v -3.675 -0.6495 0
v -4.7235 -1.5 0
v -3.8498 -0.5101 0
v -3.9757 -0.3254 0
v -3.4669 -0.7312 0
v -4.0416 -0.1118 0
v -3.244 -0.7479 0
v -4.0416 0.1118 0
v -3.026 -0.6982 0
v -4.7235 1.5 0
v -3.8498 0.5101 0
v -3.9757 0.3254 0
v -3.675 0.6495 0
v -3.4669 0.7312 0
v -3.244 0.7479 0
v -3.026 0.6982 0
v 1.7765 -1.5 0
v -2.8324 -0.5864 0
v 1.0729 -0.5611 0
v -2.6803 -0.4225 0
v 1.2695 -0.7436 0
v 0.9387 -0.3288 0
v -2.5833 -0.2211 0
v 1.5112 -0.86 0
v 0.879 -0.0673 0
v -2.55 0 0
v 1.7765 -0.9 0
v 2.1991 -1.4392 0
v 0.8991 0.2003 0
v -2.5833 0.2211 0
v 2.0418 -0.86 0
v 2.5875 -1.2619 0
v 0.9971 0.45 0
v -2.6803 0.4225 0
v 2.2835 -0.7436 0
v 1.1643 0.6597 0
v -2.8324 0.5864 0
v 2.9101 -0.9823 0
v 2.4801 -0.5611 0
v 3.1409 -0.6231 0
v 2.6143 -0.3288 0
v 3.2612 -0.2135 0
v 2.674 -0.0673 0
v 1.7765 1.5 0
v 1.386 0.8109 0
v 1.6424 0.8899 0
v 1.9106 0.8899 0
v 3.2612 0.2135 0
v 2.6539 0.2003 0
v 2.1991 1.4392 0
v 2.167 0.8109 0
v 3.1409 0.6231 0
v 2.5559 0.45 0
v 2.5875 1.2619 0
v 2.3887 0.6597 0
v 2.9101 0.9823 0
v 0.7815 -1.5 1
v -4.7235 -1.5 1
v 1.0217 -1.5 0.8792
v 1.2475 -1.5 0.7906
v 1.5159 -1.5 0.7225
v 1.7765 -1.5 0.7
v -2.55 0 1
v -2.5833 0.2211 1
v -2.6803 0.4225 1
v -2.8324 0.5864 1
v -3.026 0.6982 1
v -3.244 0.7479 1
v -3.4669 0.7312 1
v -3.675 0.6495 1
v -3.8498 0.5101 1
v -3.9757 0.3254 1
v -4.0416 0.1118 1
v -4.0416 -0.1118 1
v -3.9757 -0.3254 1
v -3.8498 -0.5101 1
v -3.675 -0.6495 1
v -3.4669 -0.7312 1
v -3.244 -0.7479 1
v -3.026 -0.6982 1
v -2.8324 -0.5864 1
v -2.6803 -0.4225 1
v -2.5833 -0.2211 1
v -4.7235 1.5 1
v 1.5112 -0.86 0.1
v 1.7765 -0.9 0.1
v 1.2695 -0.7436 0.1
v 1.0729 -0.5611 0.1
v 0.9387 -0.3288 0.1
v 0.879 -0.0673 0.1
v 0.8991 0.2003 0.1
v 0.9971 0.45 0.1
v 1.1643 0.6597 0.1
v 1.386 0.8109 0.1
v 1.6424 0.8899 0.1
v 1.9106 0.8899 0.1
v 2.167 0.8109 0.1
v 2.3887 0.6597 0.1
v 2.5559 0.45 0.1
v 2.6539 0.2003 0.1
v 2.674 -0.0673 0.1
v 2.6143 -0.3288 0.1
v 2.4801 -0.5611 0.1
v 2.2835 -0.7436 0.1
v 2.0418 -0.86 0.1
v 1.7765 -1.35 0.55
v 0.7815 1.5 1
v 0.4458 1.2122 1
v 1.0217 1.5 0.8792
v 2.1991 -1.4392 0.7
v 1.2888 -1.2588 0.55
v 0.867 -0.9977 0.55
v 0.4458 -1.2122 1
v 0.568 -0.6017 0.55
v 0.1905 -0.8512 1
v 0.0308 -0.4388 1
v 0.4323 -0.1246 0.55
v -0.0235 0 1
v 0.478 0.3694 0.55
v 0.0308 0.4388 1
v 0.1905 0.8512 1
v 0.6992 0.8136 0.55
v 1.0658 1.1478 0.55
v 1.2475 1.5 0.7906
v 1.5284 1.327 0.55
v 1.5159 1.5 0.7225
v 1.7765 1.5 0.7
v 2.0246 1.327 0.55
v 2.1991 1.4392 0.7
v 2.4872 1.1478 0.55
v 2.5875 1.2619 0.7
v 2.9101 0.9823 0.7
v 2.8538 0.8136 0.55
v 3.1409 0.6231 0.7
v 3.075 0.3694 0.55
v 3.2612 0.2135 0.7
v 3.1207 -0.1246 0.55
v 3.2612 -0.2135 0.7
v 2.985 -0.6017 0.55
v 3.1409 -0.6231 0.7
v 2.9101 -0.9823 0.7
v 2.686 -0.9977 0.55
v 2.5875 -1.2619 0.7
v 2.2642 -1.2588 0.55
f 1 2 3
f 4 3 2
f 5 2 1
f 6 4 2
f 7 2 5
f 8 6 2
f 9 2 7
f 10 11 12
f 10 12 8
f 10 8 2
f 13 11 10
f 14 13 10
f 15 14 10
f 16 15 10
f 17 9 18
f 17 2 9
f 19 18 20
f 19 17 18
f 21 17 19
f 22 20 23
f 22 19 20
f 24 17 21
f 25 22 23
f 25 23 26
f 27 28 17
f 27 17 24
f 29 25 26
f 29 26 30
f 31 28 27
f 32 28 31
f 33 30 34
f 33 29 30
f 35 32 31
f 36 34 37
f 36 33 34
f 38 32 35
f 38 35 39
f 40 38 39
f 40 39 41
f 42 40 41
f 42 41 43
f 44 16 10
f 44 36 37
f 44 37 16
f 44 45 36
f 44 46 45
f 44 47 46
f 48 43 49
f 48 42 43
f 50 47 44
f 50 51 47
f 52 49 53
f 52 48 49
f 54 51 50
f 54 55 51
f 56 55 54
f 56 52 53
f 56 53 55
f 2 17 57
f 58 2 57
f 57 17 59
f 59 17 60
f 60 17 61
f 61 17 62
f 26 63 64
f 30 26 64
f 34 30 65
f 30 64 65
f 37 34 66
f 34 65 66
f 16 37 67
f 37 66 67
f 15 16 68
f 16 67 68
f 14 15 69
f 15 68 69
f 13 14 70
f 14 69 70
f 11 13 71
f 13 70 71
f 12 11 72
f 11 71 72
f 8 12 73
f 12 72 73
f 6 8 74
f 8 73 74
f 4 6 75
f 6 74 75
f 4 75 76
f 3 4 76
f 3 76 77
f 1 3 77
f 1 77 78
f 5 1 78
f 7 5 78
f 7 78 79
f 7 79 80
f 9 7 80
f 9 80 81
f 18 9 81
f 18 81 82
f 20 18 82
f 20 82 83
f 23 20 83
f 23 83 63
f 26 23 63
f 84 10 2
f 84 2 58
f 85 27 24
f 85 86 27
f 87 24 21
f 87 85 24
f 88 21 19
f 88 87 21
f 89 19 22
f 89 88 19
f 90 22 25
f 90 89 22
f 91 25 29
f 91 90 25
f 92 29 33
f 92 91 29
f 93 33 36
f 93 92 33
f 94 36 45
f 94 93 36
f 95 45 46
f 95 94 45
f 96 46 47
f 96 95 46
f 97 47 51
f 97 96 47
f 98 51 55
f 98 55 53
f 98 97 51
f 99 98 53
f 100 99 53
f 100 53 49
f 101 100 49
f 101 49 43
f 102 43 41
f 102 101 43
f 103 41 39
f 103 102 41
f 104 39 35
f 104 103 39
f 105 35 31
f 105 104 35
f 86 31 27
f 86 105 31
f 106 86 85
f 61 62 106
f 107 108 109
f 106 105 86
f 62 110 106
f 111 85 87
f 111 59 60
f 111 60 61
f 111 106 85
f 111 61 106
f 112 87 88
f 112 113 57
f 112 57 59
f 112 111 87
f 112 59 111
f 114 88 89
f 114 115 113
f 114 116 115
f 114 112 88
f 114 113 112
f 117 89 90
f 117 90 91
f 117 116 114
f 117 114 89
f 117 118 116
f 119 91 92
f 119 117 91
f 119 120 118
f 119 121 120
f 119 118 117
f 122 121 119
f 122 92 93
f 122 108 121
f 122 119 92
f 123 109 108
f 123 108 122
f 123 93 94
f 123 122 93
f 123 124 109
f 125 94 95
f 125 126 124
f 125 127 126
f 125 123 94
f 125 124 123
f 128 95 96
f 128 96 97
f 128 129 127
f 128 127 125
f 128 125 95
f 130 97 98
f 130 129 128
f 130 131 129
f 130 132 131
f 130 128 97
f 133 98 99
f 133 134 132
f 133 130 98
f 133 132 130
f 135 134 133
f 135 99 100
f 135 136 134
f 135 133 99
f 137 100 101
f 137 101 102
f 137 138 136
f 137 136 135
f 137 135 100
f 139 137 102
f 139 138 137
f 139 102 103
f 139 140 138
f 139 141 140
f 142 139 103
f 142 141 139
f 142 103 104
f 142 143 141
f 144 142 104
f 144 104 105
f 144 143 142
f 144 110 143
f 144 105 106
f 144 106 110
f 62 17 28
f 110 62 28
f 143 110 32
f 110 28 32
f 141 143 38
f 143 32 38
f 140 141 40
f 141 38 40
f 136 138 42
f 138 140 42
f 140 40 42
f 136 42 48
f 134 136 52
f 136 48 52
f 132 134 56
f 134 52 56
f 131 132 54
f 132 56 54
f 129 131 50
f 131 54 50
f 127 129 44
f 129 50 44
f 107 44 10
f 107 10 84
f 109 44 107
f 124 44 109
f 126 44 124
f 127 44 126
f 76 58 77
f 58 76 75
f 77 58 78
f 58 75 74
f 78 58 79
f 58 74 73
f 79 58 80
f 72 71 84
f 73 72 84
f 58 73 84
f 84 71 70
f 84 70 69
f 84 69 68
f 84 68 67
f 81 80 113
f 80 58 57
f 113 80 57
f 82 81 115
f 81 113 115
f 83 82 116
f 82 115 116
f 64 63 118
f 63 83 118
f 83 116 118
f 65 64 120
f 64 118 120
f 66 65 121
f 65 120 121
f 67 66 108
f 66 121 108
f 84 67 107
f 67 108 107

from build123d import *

# Parameters (mm, degrees)
BOSS_EXTRUDE1_DEPTH   = 1
SKETCH3_W             = 1
SKETCH3_H             = 3
BOSS_EXTRUDE2_DEPTH   = 5
F_1_5MM_DOWEL_HOLE1_D = 1.5


with BuildPart() as part:
    # Sketch1 → Boss-Extrude1 (new body)
    with BuildSketch(Plane.XY):
        with BuildLine():
            Line((1.776501472, 1.5), (0.276501472, 1.5))
            Line((0.276501472, 1.5), (0.276501472, -1.5))
            Line((0.276501472, -1.5), (1.776501472, -1.5))
            ThreePointArc((1.776501472, -1.5), (3.276501472, 0), (1.776501472, 1.5))
        make_face()
    extrude(amount=BOSS_EXTRUDE1_DEPTH)

    # Sketch3 → Boss-Extrude2 (add)
    with BuildSketch(Plane.ZY.offset(-0.276501472)):
        with Locations((0.5, 0)):
            Rectangle(SKETCH3_W, SKETCH3_H)
    extrude(amount=BOSS_EXTRUDE2_DEPTH)

    # Ø1.5mm Dowel Hole1 (through all)
    with Locations(Plane(origin=(0, 0, 0), x_dir=(-1, 0, 0), z_dir=(0, 0, -1))):
        with Locations((3.3, 0)):
            Hole(F_1_5MM_DOWEL_HOLE1_D / 2)

    # Sketch8 → CSK SLOT for M1.6 Countersunk Flat Head Screw1 (revolve, cut)
    with BuildSketch(Plane(origin=(1.776501472, 0, 1), x_dir=(0, -1, 0), z_dir=(1, 0, 0))):
        Polygon((0, 0), (0, 1), (0.9, 1), (0.9, 0.9), (1.8, 0), align=None)
    revolve(axis=Axis((1.776501472, 0, 7.35), (0, 0, -1)), mode=Mode.SUBTRACT)


solid = part.part
